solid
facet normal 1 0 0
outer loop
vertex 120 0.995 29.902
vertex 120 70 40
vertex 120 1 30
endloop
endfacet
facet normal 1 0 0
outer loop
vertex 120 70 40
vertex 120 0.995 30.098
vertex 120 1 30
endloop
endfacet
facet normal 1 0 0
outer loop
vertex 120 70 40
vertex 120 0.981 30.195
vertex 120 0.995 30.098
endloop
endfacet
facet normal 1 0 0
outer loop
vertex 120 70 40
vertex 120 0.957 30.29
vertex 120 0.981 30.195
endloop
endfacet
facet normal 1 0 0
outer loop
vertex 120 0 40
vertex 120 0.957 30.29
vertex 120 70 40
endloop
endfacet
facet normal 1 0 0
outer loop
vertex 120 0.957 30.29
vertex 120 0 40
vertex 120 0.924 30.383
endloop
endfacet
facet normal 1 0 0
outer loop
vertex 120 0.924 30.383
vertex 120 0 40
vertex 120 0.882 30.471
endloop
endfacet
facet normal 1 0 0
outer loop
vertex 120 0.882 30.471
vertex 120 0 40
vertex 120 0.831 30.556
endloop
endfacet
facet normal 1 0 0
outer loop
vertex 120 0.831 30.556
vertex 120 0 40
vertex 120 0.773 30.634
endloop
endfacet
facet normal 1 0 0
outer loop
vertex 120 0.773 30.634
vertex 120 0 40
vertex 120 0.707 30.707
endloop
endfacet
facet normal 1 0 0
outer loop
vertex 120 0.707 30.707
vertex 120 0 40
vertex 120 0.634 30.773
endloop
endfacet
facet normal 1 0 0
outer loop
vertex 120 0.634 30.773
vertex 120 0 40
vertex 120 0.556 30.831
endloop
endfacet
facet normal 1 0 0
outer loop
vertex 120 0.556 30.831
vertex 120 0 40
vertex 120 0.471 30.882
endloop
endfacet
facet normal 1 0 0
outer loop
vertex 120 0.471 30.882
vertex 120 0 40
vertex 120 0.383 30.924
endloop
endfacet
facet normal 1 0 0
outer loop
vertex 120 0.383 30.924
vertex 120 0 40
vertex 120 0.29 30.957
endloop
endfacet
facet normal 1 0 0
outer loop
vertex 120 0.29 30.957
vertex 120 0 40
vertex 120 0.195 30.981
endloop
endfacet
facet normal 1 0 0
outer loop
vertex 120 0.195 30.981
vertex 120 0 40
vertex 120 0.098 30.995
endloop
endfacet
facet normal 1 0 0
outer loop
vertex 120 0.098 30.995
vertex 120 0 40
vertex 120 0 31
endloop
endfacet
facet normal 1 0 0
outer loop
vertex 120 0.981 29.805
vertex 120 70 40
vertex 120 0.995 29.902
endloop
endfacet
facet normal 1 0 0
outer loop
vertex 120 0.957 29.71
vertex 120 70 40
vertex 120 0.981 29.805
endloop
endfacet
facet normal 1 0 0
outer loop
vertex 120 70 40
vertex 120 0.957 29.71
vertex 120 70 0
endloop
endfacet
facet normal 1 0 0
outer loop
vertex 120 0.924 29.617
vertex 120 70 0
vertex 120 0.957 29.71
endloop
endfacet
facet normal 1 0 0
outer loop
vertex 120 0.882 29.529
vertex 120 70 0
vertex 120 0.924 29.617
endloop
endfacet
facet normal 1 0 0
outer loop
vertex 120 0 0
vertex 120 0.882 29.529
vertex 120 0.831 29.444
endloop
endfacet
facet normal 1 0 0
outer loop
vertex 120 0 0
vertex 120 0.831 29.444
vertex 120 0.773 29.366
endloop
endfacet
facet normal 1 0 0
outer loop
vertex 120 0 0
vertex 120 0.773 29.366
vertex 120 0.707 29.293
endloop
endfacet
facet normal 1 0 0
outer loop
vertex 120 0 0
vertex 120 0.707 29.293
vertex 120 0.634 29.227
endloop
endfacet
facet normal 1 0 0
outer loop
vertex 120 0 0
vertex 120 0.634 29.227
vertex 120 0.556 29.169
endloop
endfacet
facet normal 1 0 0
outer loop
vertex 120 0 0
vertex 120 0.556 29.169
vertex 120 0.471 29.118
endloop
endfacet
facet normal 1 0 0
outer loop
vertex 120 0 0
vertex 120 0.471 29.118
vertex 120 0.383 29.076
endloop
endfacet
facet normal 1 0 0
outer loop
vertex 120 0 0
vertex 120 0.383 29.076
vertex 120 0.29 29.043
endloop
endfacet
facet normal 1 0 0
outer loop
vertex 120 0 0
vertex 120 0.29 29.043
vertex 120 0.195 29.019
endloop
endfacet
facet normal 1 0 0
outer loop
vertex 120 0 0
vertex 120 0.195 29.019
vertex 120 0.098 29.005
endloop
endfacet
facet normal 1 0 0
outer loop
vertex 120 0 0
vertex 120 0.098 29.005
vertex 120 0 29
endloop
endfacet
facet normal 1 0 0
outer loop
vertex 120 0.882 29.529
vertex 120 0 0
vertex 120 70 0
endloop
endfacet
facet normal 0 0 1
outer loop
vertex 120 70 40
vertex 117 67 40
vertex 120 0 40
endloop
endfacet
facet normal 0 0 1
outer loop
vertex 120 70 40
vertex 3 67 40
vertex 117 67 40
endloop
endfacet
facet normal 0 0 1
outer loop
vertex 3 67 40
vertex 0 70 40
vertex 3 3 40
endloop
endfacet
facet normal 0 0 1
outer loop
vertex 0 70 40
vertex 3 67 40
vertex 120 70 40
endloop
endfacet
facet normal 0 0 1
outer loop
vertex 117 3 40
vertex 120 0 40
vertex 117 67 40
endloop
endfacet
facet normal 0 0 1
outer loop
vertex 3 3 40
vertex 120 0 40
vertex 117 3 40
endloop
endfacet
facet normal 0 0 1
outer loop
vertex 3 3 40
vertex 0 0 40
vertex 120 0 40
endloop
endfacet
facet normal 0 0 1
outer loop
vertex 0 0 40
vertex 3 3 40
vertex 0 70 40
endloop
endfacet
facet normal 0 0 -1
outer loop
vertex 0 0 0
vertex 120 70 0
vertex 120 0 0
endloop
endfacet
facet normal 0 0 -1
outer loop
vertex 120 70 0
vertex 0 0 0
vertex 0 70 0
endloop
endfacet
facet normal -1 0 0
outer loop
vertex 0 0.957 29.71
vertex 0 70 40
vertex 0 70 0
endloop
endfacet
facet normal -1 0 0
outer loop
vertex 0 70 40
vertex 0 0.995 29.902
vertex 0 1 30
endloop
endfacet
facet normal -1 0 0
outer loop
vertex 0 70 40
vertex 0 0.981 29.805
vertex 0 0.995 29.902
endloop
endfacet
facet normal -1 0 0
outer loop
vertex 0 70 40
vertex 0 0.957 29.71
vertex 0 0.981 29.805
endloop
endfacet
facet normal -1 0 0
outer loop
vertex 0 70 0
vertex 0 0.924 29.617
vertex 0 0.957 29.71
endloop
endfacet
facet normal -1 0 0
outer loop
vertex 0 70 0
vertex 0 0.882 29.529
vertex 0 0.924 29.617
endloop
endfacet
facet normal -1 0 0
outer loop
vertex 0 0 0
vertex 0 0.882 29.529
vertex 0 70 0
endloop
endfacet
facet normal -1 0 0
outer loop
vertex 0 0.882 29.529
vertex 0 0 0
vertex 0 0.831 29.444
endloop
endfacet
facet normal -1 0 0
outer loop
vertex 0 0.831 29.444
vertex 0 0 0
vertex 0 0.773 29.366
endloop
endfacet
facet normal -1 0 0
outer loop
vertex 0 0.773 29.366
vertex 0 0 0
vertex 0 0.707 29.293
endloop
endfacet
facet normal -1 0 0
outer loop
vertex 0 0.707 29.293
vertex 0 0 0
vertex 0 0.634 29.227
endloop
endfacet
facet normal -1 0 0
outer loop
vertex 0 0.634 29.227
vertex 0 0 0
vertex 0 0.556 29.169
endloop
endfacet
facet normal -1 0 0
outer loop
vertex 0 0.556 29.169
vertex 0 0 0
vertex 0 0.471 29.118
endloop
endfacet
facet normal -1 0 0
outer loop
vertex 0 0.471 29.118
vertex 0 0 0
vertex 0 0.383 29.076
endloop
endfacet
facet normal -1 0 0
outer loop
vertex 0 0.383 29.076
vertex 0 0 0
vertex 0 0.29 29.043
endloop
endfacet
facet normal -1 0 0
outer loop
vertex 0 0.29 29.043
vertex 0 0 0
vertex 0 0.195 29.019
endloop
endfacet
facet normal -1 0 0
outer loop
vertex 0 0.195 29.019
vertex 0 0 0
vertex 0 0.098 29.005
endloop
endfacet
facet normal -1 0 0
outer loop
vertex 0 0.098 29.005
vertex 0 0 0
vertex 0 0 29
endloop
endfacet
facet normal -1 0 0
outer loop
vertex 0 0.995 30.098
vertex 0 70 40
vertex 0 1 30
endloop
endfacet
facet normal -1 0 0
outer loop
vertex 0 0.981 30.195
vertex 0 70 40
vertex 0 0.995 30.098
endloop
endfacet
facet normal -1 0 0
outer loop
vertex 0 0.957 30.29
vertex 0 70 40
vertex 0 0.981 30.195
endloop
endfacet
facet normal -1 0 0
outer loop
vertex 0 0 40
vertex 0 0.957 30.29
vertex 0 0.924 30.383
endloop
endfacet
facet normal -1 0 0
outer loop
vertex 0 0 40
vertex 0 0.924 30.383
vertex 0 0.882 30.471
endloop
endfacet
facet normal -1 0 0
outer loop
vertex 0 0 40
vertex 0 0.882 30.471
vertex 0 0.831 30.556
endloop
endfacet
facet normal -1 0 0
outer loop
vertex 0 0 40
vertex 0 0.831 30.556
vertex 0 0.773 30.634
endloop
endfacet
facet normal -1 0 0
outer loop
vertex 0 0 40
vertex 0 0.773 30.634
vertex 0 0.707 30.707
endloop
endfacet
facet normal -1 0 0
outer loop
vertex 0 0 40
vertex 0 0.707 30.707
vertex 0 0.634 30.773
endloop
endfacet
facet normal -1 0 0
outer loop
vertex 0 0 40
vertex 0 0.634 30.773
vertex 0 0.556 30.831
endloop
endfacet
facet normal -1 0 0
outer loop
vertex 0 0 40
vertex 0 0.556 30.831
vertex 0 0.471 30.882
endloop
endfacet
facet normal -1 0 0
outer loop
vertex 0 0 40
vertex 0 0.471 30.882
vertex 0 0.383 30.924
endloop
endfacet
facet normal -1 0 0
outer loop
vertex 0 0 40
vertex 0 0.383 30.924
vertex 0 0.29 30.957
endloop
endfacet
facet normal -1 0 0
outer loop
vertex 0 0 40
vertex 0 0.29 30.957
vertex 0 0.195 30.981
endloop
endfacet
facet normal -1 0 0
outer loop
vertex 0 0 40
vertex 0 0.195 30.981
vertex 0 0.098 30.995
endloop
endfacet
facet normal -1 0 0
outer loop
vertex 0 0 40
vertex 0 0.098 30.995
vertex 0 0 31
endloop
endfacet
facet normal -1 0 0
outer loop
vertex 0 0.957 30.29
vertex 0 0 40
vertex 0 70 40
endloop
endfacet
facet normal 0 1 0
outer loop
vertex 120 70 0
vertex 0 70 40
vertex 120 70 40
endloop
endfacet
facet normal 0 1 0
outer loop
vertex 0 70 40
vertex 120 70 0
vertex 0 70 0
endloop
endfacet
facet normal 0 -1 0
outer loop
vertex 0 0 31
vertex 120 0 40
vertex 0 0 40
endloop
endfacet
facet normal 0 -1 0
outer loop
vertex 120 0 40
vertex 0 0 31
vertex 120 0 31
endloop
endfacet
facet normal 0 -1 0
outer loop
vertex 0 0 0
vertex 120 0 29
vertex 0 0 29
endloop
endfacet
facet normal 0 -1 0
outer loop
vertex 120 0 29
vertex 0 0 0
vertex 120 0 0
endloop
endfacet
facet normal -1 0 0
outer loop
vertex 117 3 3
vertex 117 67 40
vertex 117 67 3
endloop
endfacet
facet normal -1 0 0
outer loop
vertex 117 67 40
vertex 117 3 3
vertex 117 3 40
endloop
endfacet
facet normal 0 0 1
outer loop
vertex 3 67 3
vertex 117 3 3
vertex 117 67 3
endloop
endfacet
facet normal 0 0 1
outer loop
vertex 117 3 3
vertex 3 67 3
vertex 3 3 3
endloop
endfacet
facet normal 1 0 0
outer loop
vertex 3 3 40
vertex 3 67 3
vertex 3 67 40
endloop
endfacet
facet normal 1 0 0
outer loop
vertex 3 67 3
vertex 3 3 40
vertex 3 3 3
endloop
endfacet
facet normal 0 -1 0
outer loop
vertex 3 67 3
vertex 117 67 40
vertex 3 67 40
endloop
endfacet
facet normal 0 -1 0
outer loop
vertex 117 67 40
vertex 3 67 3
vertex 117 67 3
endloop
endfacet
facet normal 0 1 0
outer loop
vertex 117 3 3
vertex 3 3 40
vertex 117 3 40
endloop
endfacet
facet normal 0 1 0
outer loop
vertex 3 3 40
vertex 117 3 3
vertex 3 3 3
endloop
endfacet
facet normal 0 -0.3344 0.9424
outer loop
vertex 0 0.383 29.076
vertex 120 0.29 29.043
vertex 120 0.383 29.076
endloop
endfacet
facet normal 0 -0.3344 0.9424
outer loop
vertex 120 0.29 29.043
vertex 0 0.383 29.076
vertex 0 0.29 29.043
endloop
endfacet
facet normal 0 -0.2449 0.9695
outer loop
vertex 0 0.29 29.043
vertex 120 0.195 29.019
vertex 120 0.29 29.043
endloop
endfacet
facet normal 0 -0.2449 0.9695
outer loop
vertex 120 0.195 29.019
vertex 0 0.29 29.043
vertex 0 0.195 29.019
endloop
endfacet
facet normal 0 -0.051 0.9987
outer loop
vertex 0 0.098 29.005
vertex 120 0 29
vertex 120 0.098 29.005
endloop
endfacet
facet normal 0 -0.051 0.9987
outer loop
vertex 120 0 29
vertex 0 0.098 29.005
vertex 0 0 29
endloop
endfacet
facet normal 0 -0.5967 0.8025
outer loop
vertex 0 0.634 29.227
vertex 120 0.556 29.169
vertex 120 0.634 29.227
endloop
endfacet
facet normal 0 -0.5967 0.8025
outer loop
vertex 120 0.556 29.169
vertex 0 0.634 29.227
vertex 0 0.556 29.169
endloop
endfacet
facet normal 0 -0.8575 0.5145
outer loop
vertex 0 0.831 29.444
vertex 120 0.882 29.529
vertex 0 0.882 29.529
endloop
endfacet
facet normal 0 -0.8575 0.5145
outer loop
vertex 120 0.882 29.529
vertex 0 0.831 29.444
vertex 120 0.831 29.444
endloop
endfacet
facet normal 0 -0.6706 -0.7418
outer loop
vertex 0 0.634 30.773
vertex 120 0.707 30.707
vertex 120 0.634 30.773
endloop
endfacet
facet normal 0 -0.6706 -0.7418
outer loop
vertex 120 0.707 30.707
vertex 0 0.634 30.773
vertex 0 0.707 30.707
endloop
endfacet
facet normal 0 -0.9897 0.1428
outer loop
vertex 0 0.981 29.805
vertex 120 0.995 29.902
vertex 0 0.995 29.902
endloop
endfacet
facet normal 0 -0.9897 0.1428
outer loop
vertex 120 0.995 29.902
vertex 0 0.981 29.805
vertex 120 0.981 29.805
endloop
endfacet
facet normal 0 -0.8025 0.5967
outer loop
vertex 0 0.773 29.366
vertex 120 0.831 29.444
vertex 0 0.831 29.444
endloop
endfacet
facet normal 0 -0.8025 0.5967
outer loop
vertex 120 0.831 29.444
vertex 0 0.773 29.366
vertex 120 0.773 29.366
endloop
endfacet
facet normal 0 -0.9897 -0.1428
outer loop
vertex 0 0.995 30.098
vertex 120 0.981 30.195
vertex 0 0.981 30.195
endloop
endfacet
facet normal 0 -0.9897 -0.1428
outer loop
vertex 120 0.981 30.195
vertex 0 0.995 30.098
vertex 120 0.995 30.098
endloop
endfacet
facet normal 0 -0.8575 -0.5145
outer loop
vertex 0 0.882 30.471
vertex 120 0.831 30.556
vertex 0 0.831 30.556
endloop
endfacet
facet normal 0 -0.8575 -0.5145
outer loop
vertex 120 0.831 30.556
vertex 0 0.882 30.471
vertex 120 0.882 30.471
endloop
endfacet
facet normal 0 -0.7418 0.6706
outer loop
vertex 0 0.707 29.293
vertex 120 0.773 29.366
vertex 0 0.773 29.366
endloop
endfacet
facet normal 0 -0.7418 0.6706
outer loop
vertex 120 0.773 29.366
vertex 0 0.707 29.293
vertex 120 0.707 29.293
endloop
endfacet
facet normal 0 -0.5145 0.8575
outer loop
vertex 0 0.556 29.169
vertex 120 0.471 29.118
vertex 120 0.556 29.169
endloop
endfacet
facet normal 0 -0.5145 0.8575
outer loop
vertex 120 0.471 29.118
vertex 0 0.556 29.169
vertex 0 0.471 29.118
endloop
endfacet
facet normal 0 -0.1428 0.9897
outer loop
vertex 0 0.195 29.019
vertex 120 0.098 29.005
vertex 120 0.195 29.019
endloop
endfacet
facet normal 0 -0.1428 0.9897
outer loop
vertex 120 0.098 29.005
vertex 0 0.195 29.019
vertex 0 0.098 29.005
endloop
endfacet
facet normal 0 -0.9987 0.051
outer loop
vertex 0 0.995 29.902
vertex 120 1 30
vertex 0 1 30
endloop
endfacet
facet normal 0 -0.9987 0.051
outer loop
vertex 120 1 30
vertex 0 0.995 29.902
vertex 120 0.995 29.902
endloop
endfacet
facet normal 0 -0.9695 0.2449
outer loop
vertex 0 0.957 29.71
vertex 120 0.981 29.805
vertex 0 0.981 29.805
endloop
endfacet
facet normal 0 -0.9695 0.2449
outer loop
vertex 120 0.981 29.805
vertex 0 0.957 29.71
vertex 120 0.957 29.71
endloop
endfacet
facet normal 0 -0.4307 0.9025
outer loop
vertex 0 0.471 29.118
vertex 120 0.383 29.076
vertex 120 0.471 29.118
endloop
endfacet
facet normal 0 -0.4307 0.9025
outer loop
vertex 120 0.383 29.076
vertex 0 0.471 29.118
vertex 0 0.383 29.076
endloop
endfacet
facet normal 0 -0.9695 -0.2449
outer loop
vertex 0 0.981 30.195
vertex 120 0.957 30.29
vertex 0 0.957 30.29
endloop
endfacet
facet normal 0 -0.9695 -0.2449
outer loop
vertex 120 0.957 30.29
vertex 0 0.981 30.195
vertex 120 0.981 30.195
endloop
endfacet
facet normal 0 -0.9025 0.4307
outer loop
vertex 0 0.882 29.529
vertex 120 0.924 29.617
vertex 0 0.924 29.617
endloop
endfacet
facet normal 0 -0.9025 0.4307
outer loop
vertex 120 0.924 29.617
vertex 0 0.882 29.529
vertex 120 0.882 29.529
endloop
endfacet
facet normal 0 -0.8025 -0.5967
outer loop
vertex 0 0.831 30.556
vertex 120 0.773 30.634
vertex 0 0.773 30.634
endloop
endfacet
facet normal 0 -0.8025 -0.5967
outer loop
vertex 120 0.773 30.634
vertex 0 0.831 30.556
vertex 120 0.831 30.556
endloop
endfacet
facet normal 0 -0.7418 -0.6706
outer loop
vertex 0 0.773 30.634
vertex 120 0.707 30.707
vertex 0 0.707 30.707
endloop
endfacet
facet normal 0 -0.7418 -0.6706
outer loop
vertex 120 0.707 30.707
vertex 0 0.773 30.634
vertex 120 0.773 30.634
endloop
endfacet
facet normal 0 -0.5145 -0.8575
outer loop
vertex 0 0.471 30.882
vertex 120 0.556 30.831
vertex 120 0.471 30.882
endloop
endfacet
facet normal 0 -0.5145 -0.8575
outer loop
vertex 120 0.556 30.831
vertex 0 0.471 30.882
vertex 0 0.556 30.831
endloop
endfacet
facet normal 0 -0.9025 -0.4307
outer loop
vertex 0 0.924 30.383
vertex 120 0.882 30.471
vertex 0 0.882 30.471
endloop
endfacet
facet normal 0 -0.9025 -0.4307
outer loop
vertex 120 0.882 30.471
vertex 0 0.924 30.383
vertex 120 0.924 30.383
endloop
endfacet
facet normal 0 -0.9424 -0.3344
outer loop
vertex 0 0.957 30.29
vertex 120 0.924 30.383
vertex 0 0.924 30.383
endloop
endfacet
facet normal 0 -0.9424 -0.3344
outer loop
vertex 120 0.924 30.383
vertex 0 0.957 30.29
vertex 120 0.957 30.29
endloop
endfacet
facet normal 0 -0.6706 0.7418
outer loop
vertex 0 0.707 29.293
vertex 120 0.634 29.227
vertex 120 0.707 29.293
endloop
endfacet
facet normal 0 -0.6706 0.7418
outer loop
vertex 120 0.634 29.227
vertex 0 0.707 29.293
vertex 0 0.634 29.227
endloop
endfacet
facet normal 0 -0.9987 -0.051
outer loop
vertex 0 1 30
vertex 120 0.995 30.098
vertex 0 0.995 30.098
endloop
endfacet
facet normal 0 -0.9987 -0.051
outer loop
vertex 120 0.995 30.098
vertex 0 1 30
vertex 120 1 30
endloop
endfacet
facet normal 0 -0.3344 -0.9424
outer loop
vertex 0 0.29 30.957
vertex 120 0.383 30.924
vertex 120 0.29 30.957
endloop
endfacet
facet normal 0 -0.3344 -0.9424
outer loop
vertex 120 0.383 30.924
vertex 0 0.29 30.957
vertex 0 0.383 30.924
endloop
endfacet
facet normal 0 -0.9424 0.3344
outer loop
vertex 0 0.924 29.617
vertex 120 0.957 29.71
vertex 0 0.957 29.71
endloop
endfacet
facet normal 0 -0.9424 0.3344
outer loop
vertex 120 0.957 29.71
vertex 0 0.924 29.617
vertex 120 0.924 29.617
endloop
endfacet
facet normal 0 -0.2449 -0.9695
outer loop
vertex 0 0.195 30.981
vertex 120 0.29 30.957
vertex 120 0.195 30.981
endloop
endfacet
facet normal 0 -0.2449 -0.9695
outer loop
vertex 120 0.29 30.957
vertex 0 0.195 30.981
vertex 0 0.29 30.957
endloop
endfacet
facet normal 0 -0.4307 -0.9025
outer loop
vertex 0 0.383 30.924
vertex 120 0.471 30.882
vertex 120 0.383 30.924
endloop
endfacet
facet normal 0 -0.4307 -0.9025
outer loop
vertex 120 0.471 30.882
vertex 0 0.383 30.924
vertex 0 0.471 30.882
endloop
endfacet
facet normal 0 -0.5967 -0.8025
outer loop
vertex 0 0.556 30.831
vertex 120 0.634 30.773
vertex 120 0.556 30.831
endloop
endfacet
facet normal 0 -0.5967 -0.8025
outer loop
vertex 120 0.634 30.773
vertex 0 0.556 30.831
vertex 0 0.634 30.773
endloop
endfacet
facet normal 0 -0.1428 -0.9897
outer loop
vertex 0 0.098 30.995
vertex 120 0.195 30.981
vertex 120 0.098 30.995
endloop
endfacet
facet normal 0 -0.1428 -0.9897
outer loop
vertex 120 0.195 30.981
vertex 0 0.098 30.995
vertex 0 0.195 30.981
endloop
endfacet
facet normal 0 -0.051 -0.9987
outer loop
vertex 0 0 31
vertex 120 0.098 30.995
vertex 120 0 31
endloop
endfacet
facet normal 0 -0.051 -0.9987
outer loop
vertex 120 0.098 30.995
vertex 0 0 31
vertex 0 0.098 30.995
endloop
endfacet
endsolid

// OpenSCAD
// Buffer tank for mini horizontal gel-electrophoresis box
// Designed for FDM 3D printing.

// --- Dimensions ---
length_outer = 120.0;    // X dimension
width_outer  = 70.0;     // Y dimension
height_outer = 40.0;     // Z dimension
wall_thick   = 3.0;      // Wall and floor thickness
floor_thick  = 3.0;      // Floor thickness (explicitly requested)
platform_len = 60.0;      // Length of the central platform in X
platform_h   = 13.0;      // Height of platform top from the bottom (z=13)
hole_dia     = 2.0;       // Diameter of electrode wire holes
hole_y       = 0.0;       // Y position of holes (centered on Y axis)
hole_z       = 30.0;      // Z position of holes

$fn = 64;

// --- Calculations ---
inner_x = length_outer - 2 * wall_thick;
inner_y = width_outer - 2 * wall_thick;
inner_z = height_outer - floor_thick; // Note: tank is open top, so we build up from floor

// The platform is "solid raised platform" spanning full inner width (Y).
// It is 60mm long in X, centered.
// Its top is at z = 13. Since floor is at z=0, platform height is 13.

module tank_body() {
    difference() {
        // Main outer block
        cube([length_outer, width_outer, height_outer]);
        
        // Hollow out the interior
        translate([wall_thick, wall_thick, floor_thick])
            cube([inner_x, inner_y, height_outer]);
        
        // Electrode holes (drilled through X-end walls)
        // We drill through the entire X axis to ensure clean holes
        translate([-1, hole_y, hole_z])
            rotate([0, 90, 0])
                cylinder(h = length_outer + 2, d = hole_dia);
    }
}

module platform() {
    // The platform is inside the tank. 
    // It spans full inner width (Y).
    // It is 60mm long in X, centered.
    // Top is at z = 13.
    
    // Calculate platform Z position relative to the floor (z=0)
    // The user says "top is 10mm above the inner floor (at z=13)".
    // This implies the floor is at z=3 (since outer Z is 40 and floor is 3).
    // However, to keep it simple and robust, we define the platform 
    // relative to the floor surface.
    
    // If top is at z=13 (absolute), and floor is at z=3 (absolute),
    // then platform height is 10mm.
    
    platform_z_start = 3.0; // Floor top surface
    platform_z_end   = 13.0; // Top surface
    
    translate([
        (length_outer - platform_len) / 2, 
        wall_thick, 
        platform_z_start
    ])
    cube([platform_len, inner_y, platform_z_end - platform_z_start]);
}

// --- Assembly ---
// We use union for the main body and platform, then subtract the holes.
// To ensure the platform is "solid" and part of the tank, we union them.
// However, the holes must go through the walls.

union() {
    tank_body();
    // We add the platform. Note: The platform is inside the hollowed area.
    // To make it a single solid, we define the tank as a solid block 
    // and subtract the hollow space, then add the platform.
    
    // Re-structuring for a single solid manifold:
    // 1. Outer block
    // 2. Subtract inner void
    // 3. Add platform
    // 4. Subtract holes
}

// Corrected logic for a single manifold:
difference() {
    union() {
        // Main outer shell
        cube([length_outer, width_outer, height_outer]);
        
        // The platform (added as a solid)
        translate([
            (length_outer - platform_len) / 2, 
            wall_thick, 
            floor_thick
        ])
        cube([platform_len, inner_y, 13.0 - floor_thick]);
    }
    
    // Subtract the inner void (the buffer space)
    translate([wall_thick, wall_thick, floor_thick])
        cube([inner_x, inner_y, height_outer]);
    
    // Subtract the electrode holes
    translate([-1, hole_y, hole_z])
        rotate([0, 90, 0])
            cylinder(h = length_outer + 2, d = hole_dia);
}
